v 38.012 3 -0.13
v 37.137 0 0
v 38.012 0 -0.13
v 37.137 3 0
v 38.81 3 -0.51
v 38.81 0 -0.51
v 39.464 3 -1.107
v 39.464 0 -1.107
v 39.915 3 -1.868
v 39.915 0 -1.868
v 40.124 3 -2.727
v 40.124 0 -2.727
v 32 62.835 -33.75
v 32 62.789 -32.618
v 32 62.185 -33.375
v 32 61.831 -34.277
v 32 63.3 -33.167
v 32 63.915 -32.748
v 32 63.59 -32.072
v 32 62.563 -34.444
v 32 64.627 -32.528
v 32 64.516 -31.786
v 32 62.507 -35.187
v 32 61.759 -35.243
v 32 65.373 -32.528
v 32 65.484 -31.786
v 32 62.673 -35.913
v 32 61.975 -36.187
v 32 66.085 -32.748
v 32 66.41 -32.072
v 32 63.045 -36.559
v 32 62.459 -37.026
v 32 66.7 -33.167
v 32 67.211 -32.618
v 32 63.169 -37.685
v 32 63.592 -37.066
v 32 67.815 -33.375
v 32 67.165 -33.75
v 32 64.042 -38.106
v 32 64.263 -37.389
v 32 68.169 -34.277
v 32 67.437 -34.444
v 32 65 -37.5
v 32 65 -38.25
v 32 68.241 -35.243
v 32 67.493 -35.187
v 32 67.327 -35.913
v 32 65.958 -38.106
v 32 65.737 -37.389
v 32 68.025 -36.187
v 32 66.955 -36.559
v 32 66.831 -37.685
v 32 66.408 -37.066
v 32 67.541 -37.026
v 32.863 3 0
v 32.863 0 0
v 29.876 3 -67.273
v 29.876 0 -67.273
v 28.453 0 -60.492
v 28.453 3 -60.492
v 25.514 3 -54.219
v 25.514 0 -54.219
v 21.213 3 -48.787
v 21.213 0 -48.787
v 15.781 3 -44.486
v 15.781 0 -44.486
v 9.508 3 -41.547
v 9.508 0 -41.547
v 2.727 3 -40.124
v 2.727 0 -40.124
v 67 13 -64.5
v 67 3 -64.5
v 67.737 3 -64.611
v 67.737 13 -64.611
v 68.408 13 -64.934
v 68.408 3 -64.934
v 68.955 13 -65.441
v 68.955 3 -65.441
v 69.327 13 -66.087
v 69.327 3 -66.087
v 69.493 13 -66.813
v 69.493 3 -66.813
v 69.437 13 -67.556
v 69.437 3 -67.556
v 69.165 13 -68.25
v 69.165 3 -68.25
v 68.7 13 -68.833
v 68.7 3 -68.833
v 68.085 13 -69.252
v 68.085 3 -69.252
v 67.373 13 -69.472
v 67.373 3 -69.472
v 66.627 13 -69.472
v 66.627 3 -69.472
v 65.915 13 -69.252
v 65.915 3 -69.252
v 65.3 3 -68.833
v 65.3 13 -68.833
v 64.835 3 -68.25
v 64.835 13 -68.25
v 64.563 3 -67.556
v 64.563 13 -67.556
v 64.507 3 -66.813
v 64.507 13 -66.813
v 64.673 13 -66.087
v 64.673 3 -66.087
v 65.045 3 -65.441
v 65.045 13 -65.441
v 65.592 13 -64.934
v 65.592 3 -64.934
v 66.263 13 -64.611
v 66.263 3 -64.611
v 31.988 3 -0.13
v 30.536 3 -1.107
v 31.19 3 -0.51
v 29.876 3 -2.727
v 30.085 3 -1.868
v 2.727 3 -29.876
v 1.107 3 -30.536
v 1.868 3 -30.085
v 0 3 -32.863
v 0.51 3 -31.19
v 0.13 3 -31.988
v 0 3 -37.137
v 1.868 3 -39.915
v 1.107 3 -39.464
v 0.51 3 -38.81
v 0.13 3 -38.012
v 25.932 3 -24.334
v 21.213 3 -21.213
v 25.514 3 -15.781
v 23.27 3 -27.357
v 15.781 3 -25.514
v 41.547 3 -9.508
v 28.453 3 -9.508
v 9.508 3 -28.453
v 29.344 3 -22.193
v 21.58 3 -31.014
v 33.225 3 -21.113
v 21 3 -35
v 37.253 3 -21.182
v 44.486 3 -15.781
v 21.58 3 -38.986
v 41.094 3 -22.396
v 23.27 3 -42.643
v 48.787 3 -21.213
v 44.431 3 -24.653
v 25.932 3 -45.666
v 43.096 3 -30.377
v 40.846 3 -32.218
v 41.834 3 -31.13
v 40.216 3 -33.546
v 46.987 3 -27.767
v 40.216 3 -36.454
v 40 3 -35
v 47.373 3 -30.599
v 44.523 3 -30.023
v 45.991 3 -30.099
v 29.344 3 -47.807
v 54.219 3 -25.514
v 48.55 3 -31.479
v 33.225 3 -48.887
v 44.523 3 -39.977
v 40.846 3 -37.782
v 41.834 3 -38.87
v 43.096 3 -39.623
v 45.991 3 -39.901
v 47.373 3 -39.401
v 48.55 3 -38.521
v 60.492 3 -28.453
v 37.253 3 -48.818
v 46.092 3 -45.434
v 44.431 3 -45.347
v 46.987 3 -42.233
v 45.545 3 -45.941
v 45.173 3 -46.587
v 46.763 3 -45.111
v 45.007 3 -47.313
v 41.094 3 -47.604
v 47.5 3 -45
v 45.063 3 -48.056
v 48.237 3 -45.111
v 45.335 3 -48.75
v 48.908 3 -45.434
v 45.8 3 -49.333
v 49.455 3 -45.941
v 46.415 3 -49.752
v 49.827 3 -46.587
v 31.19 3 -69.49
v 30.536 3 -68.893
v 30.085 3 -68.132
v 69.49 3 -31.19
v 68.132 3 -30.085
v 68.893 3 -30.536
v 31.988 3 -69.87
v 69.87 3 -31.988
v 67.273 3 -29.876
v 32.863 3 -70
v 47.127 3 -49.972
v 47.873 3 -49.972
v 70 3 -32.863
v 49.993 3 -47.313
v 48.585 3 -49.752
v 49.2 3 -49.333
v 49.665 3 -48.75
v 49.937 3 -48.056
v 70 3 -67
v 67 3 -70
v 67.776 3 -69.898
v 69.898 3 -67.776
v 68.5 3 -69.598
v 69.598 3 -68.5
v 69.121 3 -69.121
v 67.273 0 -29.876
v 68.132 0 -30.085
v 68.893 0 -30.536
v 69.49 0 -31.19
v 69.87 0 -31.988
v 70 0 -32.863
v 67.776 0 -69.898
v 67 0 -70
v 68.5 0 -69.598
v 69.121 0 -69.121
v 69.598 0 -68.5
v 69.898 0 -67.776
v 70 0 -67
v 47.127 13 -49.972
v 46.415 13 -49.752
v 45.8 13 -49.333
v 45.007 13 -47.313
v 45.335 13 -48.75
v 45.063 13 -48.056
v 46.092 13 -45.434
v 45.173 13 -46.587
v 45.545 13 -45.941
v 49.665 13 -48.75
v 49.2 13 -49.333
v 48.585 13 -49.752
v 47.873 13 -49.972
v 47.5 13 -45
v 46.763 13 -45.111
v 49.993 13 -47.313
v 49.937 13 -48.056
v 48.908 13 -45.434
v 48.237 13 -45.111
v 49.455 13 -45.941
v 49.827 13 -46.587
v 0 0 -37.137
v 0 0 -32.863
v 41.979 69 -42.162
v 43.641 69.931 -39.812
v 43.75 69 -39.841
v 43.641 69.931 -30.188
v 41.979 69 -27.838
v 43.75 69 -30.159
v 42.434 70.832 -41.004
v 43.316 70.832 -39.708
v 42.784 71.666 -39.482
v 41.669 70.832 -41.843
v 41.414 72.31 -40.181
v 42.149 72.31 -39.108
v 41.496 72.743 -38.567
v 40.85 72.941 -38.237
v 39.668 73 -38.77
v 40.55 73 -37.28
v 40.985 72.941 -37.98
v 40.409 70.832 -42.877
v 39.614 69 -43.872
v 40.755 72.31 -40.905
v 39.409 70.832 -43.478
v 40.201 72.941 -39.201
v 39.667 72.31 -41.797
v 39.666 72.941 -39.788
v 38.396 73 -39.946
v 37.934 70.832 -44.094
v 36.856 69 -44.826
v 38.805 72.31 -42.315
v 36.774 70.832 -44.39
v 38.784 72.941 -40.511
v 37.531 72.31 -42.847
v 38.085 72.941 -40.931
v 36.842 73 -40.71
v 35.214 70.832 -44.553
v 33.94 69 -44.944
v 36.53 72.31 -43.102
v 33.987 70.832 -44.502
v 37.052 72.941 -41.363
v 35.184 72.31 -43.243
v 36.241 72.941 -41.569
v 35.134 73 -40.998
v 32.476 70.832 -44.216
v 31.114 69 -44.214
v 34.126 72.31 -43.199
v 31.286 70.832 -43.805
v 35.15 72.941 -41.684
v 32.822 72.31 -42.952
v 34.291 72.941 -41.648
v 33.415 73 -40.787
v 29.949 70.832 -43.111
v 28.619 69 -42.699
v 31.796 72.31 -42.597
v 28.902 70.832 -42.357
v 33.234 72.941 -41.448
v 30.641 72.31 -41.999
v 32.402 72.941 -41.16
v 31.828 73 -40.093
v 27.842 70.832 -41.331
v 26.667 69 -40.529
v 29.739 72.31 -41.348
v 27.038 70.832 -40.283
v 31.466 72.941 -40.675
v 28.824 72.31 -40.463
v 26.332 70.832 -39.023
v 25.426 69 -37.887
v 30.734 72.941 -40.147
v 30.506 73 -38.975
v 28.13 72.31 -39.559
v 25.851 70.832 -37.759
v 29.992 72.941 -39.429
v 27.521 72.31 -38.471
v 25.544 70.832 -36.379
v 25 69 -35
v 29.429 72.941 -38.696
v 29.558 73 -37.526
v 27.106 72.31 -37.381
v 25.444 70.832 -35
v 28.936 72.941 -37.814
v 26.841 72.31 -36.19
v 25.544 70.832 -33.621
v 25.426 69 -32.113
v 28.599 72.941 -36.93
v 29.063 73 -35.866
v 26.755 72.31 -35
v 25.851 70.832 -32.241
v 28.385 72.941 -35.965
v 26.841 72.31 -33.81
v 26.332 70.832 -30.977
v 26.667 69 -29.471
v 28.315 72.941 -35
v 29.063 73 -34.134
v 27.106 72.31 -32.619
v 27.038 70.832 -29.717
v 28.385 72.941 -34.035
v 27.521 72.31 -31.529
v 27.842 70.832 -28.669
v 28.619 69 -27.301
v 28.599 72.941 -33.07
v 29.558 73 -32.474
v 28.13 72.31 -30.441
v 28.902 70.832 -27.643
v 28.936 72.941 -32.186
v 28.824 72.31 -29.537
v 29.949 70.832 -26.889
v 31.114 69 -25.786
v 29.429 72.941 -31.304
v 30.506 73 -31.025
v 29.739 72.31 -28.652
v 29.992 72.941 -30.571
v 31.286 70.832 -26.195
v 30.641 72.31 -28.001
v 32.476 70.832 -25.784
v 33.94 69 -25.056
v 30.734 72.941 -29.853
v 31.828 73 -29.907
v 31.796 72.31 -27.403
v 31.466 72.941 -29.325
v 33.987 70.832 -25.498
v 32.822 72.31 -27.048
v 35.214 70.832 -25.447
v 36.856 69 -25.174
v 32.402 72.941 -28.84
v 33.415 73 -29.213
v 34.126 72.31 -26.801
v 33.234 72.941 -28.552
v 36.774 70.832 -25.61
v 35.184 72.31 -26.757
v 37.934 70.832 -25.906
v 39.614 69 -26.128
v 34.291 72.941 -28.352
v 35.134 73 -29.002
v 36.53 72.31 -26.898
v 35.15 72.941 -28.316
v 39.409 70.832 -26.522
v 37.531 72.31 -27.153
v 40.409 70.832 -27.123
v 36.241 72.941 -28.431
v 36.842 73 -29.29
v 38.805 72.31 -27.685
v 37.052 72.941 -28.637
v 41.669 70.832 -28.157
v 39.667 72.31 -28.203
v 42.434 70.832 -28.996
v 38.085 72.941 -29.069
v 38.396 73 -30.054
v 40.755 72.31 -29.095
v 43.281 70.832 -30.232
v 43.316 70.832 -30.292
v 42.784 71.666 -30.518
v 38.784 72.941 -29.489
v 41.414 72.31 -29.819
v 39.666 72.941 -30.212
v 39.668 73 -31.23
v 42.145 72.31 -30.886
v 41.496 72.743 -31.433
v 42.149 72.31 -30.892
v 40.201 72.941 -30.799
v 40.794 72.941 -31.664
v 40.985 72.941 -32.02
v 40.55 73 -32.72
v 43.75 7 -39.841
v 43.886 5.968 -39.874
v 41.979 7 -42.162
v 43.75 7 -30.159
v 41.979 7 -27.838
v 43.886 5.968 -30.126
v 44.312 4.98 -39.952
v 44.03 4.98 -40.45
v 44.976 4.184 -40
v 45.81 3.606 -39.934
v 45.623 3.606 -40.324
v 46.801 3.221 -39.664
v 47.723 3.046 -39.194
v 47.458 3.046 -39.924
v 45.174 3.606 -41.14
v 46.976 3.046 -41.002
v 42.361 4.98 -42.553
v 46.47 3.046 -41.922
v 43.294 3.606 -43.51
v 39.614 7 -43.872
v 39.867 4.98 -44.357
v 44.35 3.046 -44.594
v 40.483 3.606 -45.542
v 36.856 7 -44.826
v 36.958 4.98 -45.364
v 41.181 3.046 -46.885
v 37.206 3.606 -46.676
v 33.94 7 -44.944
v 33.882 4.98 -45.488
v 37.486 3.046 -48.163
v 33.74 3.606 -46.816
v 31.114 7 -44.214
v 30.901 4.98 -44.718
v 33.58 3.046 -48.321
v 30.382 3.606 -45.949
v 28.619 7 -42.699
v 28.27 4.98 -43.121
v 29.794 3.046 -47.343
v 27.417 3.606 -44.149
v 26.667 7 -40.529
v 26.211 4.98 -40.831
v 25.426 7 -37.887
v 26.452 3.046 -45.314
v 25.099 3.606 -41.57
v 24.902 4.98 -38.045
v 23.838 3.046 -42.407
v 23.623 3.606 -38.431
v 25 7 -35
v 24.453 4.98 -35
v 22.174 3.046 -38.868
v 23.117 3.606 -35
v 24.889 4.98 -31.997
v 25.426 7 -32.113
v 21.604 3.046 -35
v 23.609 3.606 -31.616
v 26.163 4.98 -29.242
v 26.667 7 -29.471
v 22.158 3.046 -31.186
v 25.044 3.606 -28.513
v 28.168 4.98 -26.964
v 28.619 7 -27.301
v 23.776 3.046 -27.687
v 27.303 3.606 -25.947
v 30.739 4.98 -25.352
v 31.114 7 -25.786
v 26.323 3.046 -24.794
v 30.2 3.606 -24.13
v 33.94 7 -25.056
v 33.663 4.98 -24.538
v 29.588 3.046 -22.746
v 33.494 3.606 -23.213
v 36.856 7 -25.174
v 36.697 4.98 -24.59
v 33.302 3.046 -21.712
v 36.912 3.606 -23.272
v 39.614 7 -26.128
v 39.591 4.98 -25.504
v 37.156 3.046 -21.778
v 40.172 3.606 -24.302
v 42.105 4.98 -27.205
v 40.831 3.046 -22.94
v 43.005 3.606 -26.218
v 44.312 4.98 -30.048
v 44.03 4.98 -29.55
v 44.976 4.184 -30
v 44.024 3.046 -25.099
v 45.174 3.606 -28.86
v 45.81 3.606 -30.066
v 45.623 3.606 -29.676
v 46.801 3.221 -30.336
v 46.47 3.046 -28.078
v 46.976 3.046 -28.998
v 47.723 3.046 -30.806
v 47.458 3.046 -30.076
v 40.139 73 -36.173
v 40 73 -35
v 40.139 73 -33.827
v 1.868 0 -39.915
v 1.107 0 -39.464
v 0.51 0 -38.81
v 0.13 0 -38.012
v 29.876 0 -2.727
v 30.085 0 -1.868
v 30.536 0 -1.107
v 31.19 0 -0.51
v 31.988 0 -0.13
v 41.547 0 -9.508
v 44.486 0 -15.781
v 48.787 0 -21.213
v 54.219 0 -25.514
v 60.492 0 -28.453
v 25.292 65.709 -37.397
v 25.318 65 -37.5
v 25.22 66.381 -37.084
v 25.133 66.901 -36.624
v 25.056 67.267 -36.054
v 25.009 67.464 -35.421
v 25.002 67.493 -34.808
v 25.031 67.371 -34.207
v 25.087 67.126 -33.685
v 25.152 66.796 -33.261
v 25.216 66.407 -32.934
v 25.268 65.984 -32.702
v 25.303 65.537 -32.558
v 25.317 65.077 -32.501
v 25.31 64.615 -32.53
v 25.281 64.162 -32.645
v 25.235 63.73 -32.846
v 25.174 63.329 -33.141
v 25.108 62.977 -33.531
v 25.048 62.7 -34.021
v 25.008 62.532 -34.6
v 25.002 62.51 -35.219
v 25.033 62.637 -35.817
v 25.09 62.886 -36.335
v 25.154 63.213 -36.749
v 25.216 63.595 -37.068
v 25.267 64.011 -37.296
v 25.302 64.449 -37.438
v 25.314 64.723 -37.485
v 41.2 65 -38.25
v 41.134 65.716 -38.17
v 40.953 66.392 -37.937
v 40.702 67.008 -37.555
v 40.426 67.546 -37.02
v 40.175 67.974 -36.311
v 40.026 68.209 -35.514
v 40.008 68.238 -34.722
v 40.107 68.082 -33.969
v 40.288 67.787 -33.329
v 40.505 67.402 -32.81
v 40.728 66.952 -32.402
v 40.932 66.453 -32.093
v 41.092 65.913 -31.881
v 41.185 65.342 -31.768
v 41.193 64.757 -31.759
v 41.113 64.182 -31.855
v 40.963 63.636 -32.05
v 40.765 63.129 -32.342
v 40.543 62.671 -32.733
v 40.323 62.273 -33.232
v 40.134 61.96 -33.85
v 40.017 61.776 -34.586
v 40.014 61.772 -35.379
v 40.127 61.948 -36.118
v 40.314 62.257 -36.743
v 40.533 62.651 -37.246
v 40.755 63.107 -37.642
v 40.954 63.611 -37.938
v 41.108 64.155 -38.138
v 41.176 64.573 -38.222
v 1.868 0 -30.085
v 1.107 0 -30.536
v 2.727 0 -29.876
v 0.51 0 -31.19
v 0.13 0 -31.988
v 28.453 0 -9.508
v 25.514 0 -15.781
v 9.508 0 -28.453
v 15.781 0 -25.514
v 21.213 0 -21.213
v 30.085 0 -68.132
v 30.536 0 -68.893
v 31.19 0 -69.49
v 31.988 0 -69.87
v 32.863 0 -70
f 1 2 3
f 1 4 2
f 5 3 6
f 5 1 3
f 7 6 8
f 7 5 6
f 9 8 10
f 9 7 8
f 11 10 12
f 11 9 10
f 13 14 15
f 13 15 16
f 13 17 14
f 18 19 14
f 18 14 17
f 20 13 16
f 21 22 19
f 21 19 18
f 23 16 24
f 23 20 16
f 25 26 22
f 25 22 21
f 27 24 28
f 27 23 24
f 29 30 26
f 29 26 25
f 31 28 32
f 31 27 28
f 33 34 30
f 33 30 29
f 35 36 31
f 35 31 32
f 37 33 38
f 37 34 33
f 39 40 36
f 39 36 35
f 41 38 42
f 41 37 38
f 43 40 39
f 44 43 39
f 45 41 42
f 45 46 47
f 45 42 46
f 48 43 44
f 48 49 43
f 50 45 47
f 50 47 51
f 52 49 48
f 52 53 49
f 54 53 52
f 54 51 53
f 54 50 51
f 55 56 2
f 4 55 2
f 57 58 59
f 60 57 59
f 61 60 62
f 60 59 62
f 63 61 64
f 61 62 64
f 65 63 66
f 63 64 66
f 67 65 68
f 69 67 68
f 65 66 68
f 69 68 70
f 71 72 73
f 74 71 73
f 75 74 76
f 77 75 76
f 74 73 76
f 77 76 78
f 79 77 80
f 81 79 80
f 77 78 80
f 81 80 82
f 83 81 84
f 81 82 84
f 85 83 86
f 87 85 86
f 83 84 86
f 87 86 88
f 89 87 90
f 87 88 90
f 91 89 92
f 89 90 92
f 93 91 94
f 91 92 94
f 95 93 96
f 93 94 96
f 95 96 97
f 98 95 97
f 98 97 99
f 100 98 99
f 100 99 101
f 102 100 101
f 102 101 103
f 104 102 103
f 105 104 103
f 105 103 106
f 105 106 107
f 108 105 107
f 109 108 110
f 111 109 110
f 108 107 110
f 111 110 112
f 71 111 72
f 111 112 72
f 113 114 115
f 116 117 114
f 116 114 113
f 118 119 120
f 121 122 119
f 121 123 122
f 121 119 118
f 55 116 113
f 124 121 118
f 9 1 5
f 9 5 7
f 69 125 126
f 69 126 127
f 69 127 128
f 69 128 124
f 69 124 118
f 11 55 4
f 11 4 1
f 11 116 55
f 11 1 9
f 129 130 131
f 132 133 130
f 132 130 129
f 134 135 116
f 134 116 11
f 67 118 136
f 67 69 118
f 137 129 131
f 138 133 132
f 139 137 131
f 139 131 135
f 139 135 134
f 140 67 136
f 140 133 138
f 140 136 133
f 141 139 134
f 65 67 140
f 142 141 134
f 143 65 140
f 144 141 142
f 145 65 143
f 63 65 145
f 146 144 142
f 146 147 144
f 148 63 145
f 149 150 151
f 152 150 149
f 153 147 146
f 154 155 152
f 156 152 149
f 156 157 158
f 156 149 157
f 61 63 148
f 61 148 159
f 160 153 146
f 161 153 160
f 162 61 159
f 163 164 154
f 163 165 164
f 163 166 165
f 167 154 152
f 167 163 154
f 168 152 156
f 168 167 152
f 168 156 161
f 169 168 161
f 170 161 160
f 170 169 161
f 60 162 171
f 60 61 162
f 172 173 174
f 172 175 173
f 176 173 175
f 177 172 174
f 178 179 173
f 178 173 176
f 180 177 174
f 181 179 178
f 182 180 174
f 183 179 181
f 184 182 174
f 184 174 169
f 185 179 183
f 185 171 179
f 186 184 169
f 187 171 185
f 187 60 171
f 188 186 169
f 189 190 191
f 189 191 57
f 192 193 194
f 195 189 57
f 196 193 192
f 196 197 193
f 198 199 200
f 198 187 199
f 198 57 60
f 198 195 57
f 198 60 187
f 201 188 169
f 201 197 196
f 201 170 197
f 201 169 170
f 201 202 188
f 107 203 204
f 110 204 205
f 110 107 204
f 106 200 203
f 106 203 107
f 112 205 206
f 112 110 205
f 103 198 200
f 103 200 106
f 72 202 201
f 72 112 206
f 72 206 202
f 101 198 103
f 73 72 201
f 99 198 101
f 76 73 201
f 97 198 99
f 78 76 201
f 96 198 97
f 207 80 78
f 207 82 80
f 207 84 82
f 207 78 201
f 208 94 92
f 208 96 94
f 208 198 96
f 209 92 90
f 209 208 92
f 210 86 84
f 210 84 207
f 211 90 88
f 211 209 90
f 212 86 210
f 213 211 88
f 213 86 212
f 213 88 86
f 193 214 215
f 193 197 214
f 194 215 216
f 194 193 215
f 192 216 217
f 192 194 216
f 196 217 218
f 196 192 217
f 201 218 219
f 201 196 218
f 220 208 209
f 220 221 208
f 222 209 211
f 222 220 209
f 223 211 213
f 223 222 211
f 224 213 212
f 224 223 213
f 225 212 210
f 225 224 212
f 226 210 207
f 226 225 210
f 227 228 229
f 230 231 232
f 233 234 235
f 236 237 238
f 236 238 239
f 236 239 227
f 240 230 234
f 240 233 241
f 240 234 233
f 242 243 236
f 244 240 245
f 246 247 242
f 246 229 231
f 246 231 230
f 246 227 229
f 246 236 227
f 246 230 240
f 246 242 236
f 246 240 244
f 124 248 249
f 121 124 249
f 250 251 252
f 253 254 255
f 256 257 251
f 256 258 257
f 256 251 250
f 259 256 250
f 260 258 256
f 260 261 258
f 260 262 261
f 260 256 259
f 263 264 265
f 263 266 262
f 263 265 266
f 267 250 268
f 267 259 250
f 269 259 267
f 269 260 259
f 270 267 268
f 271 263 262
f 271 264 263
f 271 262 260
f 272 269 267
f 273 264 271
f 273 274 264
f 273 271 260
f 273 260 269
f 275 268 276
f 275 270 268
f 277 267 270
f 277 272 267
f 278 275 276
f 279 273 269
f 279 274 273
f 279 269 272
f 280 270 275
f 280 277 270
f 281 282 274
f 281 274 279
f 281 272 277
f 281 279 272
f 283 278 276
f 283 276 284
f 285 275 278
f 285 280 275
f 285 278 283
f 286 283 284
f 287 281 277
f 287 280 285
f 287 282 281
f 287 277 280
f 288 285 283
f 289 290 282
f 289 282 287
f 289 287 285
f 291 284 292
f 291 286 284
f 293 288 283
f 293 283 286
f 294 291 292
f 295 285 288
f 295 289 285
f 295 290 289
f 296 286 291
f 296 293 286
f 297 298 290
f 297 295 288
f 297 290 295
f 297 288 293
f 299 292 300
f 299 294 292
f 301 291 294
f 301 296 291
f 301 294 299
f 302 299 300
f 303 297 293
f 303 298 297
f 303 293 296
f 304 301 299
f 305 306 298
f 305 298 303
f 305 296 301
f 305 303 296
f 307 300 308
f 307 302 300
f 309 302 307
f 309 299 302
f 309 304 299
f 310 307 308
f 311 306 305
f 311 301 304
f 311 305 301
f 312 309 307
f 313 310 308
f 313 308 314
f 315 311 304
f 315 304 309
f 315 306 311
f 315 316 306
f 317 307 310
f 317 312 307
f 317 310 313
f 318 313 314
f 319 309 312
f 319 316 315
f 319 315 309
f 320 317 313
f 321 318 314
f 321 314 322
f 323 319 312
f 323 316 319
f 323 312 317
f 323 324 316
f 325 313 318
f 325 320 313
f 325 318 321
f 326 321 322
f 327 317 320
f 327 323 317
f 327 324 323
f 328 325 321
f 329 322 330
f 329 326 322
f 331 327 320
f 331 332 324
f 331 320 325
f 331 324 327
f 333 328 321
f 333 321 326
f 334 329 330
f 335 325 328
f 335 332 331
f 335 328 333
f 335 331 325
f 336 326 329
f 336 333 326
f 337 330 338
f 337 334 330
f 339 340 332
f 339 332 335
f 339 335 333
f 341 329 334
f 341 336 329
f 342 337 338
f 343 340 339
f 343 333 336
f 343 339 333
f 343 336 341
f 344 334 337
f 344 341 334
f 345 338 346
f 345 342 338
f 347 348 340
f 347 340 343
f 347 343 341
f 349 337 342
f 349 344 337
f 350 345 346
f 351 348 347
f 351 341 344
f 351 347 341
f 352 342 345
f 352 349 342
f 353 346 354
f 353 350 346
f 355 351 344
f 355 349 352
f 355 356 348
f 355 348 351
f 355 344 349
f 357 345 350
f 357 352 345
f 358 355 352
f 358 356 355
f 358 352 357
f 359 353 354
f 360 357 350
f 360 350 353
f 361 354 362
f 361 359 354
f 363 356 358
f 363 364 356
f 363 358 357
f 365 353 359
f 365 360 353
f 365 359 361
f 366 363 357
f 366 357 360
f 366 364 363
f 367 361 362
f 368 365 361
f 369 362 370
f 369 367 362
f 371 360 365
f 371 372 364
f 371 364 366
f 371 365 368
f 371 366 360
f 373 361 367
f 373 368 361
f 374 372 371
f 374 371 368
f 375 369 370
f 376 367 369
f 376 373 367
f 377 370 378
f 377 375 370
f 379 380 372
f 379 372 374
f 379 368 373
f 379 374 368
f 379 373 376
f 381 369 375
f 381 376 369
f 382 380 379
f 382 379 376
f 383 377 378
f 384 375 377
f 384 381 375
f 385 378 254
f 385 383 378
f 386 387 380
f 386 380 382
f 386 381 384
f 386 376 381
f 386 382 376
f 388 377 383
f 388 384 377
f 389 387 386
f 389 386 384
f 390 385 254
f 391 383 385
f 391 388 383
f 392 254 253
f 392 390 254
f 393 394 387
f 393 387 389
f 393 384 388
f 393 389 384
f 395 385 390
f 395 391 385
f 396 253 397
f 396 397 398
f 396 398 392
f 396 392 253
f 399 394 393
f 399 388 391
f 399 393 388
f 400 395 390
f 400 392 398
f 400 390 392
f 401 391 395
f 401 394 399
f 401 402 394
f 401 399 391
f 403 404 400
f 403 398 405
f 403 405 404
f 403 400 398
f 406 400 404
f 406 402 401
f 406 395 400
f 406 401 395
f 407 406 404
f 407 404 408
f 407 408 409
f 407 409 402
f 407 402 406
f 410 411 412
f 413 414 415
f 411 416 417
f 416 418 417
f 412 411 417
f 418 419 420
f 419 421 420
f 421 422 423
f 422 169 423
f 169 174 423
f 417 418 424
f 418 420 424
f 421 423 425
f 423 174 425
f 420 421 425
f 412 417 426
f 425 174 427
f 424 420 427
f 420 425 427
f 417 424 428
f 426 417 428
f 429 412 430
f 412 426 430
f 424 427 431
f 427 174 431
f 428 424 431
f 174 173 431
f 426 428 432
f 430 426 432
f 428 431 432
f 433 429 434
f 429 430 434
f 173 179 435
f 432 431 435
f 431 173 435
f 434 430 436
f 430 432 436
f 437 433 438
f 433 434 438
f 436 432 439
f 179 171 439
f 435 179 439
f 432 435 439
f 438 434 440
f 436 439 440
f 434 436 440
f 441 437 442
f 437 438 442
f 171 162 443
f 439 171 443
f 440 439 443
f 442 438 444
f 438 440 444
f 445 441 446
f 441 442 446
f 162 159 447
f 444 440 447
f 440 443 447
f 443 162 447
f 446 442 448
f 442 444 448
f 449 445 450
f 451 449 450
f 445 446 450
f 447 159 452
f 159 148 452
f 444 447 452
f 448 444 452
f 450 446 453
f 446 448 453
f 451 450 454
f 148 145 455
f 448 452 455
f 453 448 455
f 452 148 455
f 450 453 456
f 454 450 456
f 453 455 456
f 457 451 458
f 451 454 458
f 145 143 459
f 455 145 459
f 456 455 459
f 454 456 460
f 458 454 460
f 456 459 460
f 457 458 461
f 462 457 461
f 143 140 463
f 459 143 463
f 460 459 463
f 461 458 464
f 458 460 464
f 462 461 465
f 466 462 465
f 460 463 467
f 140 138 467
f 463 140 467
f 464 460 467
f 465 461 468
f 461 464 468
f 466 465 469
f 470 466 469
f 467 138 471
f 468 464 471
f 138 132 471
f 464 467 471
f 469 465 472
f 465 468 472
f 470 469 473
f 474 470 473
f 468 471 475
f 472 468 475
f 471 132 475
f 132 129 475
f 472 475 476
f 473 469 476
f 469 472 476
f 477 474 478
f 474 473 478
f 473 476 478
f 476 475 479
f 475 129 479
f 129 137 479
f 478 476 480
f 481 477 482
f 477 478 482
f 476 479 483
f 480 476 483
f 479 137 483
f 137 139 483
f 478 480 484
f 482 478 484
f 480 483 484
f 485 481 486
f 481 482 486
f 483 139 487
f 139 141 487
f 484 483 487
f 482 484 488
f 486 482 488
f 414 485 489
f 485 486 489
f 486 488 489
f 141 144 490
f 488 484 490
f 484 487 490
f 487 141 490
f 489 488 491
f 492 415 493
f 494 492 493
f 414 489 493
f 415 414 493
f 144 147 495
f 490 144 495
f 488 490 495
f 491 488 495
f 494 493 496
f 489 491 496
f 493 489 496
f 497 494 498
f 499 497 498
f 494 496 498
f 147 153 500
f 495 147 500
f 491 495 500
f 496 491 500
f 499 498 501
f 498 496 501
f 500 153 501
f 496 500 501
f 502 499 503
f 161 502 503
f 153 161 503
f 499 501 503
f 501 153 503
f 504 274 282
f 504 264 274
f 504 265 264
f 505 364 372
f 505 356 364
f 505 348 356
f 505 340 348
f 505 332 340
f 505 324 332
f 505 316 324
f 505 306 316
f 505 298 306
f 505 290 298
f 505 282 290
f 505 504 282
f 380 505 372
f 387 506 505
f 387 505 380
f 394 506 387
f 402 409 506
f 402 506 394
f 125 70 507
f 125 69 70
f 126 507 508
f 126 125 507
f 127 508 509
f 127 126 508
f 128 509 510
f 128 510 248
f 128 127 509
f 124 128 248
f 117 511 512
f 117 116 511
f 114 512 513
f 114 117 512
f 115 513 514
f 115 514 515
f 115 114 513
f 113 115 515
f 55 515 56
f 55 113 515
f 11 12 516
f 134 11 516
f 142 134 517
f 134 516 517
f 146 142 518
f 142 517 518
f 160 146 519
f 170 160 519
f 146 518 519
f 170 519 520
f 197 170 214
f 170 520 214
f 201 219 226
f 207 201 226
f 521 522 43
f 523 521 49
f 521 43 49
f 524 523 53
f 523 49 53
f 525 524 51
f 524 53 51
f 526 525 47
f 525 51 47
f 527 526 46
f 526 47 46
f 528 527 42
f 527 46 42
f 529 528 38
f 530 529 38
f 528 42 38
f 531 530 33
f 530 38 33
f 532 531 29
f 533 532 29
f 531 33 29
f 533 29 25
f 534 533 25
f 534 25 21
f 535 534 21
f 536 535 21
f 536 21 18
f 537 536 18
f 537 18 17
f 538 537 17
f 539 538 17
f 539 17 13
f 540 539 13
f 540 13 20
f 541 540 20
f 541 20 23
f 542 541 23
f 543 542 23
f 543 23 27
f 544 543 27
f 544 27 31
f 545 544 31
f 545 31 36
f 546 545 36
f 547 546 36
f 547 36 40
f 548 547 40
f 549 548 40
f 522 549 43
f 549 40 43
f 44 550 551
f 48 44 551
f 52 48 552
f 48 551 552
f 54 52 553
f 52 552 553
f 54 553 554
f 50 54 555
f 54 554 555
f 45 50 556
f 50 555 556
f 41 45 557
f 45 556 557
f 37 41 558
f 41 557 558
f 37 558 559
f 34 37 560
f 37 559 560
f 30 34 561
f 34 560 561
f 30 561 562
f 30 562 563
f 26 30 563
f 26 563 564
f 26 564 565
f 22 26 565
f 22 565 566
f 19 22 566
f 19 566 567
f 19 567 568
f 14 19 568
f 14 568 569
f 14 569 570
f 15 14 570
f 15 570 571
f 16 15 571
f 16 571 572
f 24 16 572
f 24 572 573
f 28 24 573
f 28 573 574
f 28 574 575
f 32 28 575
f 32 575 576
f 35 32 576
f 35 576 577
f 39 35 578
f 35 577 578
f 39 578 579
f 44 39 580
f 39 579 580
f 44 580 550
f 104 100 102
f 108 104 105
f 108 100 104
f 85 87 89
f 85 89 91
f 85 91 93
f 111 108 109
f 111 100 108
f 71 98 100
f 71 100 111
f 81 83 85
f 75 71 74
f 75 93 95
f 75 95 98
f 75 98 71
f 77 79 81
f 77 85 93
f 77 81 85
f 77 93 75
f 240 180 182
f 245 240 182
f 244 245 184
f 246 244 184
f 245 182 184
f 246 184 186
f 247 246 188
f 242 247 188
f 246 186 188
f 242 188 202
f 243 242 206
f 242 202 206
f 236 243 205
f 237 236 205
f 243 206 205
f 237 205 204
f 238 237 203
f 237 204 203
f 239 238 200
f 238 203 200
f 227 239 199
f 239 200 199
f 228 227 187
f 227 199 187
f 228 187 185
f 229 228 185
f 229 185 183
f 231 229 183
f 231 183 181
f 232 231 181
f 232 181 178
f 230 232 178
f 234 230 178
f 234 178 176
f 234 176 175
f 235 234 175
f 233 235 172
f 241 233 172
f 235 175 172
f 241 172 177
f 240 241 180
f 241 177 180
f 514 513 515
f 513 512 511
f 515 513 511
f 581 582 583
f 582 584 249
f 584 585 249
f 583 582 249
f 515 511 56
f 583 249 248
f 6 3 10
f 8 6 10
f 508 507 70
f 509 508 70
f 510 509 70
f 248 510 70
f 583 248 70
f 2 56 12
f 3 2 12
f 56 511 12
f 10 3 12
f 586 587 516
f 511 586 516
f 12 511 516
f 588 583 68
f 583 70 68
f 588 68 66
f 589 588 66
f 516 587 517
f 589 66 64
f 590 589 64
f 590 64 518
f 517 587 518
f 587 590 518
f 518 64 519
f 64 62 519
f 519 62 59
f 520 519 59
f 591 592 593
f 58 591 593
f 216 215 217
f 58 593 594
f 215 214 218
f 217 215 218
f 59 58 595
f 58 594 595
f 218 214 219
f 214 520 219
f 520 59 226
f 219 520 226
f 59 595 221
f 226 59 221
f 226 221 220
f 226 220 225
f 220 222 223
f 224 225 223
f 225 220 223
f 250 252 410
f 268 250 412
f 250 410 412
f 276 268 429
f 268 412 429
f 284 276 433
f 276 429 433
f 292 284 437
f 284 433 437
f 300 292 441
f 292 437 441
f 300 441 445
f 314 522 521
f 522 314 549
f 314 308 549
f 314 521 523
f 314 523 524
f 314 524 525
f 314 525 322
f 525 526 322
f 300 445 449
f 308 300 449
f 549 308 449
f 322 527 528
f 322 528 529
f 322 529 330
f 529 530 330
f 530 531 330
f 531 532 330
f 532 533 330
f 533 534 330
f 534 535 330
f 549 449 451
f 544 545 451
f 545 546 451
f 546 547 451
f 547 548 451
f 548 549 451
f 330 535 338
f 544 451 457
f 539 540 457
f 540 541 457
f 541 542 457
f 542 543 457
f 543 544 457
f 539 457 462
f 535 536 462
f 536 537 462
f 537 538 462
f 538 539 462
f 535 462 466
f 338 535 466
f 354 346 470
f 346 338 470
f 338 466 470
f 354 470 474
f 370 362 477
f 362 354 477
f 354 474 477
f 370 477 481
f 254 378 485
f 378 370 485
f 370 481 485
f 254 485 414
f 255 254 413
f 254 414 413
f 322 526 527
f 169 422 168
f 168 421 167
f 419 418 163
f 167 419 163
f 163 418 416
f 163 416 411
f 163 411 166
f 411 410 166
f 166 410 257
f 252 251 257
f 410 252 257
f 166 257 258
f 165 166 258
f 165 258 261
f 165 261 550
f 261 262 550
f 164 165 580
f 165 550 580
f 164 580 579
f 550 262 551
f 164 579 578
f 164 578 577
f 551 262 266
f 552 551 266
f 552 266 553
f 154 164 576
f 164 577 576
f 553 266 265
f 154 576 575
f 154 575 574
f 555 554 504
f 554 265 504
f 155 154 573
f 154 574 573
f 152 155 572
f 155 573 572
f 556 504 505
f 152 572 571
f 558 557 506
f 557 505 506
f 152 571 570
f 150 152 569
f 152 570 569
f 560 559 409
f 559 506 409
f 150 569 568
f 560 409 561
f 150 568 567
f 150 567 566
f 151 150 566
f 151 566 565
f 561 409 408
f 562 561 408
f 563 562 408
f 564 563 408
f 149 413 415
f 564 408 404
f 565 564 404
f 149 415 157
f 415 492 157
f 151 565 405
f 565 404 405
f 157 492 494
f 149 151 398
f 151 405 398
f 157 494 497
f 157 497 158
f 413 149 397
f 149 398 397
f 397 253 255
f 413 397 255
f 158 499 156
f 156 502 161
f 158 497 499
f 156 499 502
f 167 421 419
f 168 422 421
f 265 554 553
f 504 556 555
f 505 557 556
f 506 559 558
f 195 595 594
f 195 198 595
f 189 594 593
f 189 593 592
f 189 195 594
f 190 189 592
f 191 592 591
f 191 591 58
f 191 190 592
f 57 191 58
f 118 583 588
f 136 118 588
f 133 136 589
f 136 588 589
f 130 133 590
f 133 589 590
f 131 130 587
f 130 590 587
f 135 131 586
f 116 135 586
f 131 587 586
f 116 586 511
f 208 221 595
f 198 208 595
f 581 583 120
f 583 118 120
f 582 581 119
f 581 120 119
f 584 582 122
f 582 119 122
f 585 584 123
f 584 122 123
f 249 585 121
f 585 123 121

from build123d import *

# Parameters (mm, degrees)
BOSS_EXTRUDE1_DEPTH = 3
FILLET1_R           = 3
SKETCH2_R           = 10
BOSS_EXTRUDE3_DEPTH = 70
SKETCH4_R           = 2.5
CUT_EXTRUDE2_DEPTH  = 70
SKETCH7_R           = 3.25
CUT_EXTRUDE3_DEPTH  = 38
FILLET3_R           = 4
SKETCH8_R           = 5
CUT_EXTRUDE4_DEPTH  = 70
SKETCH10_W          = 35
SKETCH10_H          = 35
BOSS_EXTRUDE5_DEPTH = 3
FILLET5_R           = 3
SKETCH11_R          = 2.5
BOSS_EXTRUDE6_DEPTH = 10
FILLET6_R           = 4


with BuildPart() as part:
    # Sketch1 → Boss-Extrude1 (new body)
    with BuildSketch(Plane(origin=(0, 0, 0), x_dir=(1, 0, 0), z_dir=(0, 1, 0))):
        with BuildLine():
            ThreePointArc((0, 30), (21.213203436, 21.213203436), (30, 0))
            Line((30, 0), (40, 0))
            ThreePointArc((40, 0), (48.786796564, 21.213203436), (70, 30))
            Line((70, 30), (70, 40))
            ThreePointArc((70, 40), (48.786796564, 48.786796564), (40, 70))
            Line((40, 70), (30, 70))
            ThreePointArc((30, 70), (21.213203436, 48.786796564), (0, 40))
            Line((0, 40), (0, 30))
        make_face()
    extrude(amount=BOSS_EXTRUDE1_DEPTH)

    # Fillet1
    fillet1_edges = [part.edges().sort_by_distance(p)[0] for p in [
        (70, 1.5, -40),
        (70, 1.5, -30),
        (40, 1.5, 0),
        (30, 1.5, 0),
        (0, 1.5, -30),
        (0, 1.5, -40),
        (30, 1.5, -70),
        (40, 1.5, -70),
    ]]
    fillet(fillet1_edges, radius=FILLET1_R)

    # Sketch2 → Boss-Extrude3 (add)
    with BuildSketch(Plane(origin=(0, 3, 0), x_dir=(1, 0, 0), z_dir=(0, 1, 0))):
        with Locations(Location((35, 35, 0), (0, 0, 270))):
            Circle(SKETCH2_R)
    extrude(amount=BOSS_EXTRUDE3_DEPTH)

    # Sketch4 → Cut-Extrude2 (cut)
    with BuildSketch(Plane(origin=(70, 0, 0), x_dir=(0, 0, -1), z_dir=(1, 0, 0))):
        with Locations((35, 65)):
            Circle(SKETCH4_R)
    extrude(amount=-CUT_EXTRUDE2_DEPTH, mode=Mode.SUBTRACT)

    # Sketch7 → Cut-Extrude3 (cut)
    with BuildSketch(Plane(origin=(70, 0, 0), x_dir=(0, 0, -1), z_dir=(1, 0, 0))):
        with Locations((35, 65)):
            Circle(SKETCH7_R)
    extrude(amount=-CUT_EXTRUDE3_DEPTH, mode=Mode.SUBTRACT)

    # Fillet3
    fillet3_edges = [part.edges().sort_by_distance(p)[0] for p in [
        (35, 73, -45),
    ]]
    fillet(fillet3_edges, radius=FILLET3_R)

    # Sketch8 → Cut-Extrude4 (cut)
    with BuildSketch(Plane(origin=(0, 73, 0), x_dir=(1, 0, 0), z_dir=(0, 1, 0))):
        with Locations((45, 35)):
            Circle(SKETCH8_R)
    extrude(amount=-CUT_EXTRUDE4_DEPTH, mode=Mode.SUBTRACT)

    # Sketch10 → Boss-Extrude5 (add)
    with BuildSketch(Plane(origin=(0, 3, 0), x_dir=(1, 0, 0), z_dir=(0, 1, 0))):
        with Locations((52.5, 52.5)):
            Rectangle(SKETCH10_W, SKETCH10_H)
    extrude(amount=-BOSS_EXTRUDE5_DEPTH)

    # Fillet5
    fillet5_edges = [part.edges().sort_by_distance(p)[0] for p in [
        (70, 1.5, -70),
    ]]
    fillet(fillet5_edges, radius=FILLET5_R)

    # Sketch11 → Boss-Extrude6 (add)
    with BuildSketch(Plane(origin=(0, 3, 0), x_dir=(1, 0, 0), z_dir=(0, 1, 0))):
        with Locations(Location((67, 67, 0), (0, 0, 270))):
            Circle(SKETCH11_R)
        with Locations(Location((47.5, 47.5, 0), (0, 0, 270))):
            Circle(SKETCH11_R)
    extrude(amount=BOSS_EXTRUDE6_DEPTH)

    # Fillet6
    # the kernel refuses this fillet: 4 mm, written as the material it adds along each edge
    with BuildSketch(Plane(origin=(35, 3, -35), x_dir=(0.9999950652018581, 0, -0.0031415874858794265), z_dir=(0.0031415874858794265, 0, 0.9999950652018581))) as fillet6_piece_1_section:
        with BuildLine():
            CenterArc((10 + FILLET6_R, FILLET6_R), FILLET6_R, 180, 90)
            Line((10, FILLET6_R), (10, 0))
            Line((10, 0), (10 + FILLET6_R, 0))
        make_face()
    fillet6_piece_1 = revolve(axis=Axis((35, 3, -35), (0, 1, 0)), revolution_arc=359.64, mode=Mode.PRIVATE)
    fillet6_piece_1 = fillet6_piece_1 - Plane(origin=(45, 4.127744663, -35), x_dir=(1, 0, 0), z_dir=(0, 1, 0)) * Cylinder(5, 56, mode=Mode.PRIVATE)
    add(fillet6_piece_1)


solid = part.part
